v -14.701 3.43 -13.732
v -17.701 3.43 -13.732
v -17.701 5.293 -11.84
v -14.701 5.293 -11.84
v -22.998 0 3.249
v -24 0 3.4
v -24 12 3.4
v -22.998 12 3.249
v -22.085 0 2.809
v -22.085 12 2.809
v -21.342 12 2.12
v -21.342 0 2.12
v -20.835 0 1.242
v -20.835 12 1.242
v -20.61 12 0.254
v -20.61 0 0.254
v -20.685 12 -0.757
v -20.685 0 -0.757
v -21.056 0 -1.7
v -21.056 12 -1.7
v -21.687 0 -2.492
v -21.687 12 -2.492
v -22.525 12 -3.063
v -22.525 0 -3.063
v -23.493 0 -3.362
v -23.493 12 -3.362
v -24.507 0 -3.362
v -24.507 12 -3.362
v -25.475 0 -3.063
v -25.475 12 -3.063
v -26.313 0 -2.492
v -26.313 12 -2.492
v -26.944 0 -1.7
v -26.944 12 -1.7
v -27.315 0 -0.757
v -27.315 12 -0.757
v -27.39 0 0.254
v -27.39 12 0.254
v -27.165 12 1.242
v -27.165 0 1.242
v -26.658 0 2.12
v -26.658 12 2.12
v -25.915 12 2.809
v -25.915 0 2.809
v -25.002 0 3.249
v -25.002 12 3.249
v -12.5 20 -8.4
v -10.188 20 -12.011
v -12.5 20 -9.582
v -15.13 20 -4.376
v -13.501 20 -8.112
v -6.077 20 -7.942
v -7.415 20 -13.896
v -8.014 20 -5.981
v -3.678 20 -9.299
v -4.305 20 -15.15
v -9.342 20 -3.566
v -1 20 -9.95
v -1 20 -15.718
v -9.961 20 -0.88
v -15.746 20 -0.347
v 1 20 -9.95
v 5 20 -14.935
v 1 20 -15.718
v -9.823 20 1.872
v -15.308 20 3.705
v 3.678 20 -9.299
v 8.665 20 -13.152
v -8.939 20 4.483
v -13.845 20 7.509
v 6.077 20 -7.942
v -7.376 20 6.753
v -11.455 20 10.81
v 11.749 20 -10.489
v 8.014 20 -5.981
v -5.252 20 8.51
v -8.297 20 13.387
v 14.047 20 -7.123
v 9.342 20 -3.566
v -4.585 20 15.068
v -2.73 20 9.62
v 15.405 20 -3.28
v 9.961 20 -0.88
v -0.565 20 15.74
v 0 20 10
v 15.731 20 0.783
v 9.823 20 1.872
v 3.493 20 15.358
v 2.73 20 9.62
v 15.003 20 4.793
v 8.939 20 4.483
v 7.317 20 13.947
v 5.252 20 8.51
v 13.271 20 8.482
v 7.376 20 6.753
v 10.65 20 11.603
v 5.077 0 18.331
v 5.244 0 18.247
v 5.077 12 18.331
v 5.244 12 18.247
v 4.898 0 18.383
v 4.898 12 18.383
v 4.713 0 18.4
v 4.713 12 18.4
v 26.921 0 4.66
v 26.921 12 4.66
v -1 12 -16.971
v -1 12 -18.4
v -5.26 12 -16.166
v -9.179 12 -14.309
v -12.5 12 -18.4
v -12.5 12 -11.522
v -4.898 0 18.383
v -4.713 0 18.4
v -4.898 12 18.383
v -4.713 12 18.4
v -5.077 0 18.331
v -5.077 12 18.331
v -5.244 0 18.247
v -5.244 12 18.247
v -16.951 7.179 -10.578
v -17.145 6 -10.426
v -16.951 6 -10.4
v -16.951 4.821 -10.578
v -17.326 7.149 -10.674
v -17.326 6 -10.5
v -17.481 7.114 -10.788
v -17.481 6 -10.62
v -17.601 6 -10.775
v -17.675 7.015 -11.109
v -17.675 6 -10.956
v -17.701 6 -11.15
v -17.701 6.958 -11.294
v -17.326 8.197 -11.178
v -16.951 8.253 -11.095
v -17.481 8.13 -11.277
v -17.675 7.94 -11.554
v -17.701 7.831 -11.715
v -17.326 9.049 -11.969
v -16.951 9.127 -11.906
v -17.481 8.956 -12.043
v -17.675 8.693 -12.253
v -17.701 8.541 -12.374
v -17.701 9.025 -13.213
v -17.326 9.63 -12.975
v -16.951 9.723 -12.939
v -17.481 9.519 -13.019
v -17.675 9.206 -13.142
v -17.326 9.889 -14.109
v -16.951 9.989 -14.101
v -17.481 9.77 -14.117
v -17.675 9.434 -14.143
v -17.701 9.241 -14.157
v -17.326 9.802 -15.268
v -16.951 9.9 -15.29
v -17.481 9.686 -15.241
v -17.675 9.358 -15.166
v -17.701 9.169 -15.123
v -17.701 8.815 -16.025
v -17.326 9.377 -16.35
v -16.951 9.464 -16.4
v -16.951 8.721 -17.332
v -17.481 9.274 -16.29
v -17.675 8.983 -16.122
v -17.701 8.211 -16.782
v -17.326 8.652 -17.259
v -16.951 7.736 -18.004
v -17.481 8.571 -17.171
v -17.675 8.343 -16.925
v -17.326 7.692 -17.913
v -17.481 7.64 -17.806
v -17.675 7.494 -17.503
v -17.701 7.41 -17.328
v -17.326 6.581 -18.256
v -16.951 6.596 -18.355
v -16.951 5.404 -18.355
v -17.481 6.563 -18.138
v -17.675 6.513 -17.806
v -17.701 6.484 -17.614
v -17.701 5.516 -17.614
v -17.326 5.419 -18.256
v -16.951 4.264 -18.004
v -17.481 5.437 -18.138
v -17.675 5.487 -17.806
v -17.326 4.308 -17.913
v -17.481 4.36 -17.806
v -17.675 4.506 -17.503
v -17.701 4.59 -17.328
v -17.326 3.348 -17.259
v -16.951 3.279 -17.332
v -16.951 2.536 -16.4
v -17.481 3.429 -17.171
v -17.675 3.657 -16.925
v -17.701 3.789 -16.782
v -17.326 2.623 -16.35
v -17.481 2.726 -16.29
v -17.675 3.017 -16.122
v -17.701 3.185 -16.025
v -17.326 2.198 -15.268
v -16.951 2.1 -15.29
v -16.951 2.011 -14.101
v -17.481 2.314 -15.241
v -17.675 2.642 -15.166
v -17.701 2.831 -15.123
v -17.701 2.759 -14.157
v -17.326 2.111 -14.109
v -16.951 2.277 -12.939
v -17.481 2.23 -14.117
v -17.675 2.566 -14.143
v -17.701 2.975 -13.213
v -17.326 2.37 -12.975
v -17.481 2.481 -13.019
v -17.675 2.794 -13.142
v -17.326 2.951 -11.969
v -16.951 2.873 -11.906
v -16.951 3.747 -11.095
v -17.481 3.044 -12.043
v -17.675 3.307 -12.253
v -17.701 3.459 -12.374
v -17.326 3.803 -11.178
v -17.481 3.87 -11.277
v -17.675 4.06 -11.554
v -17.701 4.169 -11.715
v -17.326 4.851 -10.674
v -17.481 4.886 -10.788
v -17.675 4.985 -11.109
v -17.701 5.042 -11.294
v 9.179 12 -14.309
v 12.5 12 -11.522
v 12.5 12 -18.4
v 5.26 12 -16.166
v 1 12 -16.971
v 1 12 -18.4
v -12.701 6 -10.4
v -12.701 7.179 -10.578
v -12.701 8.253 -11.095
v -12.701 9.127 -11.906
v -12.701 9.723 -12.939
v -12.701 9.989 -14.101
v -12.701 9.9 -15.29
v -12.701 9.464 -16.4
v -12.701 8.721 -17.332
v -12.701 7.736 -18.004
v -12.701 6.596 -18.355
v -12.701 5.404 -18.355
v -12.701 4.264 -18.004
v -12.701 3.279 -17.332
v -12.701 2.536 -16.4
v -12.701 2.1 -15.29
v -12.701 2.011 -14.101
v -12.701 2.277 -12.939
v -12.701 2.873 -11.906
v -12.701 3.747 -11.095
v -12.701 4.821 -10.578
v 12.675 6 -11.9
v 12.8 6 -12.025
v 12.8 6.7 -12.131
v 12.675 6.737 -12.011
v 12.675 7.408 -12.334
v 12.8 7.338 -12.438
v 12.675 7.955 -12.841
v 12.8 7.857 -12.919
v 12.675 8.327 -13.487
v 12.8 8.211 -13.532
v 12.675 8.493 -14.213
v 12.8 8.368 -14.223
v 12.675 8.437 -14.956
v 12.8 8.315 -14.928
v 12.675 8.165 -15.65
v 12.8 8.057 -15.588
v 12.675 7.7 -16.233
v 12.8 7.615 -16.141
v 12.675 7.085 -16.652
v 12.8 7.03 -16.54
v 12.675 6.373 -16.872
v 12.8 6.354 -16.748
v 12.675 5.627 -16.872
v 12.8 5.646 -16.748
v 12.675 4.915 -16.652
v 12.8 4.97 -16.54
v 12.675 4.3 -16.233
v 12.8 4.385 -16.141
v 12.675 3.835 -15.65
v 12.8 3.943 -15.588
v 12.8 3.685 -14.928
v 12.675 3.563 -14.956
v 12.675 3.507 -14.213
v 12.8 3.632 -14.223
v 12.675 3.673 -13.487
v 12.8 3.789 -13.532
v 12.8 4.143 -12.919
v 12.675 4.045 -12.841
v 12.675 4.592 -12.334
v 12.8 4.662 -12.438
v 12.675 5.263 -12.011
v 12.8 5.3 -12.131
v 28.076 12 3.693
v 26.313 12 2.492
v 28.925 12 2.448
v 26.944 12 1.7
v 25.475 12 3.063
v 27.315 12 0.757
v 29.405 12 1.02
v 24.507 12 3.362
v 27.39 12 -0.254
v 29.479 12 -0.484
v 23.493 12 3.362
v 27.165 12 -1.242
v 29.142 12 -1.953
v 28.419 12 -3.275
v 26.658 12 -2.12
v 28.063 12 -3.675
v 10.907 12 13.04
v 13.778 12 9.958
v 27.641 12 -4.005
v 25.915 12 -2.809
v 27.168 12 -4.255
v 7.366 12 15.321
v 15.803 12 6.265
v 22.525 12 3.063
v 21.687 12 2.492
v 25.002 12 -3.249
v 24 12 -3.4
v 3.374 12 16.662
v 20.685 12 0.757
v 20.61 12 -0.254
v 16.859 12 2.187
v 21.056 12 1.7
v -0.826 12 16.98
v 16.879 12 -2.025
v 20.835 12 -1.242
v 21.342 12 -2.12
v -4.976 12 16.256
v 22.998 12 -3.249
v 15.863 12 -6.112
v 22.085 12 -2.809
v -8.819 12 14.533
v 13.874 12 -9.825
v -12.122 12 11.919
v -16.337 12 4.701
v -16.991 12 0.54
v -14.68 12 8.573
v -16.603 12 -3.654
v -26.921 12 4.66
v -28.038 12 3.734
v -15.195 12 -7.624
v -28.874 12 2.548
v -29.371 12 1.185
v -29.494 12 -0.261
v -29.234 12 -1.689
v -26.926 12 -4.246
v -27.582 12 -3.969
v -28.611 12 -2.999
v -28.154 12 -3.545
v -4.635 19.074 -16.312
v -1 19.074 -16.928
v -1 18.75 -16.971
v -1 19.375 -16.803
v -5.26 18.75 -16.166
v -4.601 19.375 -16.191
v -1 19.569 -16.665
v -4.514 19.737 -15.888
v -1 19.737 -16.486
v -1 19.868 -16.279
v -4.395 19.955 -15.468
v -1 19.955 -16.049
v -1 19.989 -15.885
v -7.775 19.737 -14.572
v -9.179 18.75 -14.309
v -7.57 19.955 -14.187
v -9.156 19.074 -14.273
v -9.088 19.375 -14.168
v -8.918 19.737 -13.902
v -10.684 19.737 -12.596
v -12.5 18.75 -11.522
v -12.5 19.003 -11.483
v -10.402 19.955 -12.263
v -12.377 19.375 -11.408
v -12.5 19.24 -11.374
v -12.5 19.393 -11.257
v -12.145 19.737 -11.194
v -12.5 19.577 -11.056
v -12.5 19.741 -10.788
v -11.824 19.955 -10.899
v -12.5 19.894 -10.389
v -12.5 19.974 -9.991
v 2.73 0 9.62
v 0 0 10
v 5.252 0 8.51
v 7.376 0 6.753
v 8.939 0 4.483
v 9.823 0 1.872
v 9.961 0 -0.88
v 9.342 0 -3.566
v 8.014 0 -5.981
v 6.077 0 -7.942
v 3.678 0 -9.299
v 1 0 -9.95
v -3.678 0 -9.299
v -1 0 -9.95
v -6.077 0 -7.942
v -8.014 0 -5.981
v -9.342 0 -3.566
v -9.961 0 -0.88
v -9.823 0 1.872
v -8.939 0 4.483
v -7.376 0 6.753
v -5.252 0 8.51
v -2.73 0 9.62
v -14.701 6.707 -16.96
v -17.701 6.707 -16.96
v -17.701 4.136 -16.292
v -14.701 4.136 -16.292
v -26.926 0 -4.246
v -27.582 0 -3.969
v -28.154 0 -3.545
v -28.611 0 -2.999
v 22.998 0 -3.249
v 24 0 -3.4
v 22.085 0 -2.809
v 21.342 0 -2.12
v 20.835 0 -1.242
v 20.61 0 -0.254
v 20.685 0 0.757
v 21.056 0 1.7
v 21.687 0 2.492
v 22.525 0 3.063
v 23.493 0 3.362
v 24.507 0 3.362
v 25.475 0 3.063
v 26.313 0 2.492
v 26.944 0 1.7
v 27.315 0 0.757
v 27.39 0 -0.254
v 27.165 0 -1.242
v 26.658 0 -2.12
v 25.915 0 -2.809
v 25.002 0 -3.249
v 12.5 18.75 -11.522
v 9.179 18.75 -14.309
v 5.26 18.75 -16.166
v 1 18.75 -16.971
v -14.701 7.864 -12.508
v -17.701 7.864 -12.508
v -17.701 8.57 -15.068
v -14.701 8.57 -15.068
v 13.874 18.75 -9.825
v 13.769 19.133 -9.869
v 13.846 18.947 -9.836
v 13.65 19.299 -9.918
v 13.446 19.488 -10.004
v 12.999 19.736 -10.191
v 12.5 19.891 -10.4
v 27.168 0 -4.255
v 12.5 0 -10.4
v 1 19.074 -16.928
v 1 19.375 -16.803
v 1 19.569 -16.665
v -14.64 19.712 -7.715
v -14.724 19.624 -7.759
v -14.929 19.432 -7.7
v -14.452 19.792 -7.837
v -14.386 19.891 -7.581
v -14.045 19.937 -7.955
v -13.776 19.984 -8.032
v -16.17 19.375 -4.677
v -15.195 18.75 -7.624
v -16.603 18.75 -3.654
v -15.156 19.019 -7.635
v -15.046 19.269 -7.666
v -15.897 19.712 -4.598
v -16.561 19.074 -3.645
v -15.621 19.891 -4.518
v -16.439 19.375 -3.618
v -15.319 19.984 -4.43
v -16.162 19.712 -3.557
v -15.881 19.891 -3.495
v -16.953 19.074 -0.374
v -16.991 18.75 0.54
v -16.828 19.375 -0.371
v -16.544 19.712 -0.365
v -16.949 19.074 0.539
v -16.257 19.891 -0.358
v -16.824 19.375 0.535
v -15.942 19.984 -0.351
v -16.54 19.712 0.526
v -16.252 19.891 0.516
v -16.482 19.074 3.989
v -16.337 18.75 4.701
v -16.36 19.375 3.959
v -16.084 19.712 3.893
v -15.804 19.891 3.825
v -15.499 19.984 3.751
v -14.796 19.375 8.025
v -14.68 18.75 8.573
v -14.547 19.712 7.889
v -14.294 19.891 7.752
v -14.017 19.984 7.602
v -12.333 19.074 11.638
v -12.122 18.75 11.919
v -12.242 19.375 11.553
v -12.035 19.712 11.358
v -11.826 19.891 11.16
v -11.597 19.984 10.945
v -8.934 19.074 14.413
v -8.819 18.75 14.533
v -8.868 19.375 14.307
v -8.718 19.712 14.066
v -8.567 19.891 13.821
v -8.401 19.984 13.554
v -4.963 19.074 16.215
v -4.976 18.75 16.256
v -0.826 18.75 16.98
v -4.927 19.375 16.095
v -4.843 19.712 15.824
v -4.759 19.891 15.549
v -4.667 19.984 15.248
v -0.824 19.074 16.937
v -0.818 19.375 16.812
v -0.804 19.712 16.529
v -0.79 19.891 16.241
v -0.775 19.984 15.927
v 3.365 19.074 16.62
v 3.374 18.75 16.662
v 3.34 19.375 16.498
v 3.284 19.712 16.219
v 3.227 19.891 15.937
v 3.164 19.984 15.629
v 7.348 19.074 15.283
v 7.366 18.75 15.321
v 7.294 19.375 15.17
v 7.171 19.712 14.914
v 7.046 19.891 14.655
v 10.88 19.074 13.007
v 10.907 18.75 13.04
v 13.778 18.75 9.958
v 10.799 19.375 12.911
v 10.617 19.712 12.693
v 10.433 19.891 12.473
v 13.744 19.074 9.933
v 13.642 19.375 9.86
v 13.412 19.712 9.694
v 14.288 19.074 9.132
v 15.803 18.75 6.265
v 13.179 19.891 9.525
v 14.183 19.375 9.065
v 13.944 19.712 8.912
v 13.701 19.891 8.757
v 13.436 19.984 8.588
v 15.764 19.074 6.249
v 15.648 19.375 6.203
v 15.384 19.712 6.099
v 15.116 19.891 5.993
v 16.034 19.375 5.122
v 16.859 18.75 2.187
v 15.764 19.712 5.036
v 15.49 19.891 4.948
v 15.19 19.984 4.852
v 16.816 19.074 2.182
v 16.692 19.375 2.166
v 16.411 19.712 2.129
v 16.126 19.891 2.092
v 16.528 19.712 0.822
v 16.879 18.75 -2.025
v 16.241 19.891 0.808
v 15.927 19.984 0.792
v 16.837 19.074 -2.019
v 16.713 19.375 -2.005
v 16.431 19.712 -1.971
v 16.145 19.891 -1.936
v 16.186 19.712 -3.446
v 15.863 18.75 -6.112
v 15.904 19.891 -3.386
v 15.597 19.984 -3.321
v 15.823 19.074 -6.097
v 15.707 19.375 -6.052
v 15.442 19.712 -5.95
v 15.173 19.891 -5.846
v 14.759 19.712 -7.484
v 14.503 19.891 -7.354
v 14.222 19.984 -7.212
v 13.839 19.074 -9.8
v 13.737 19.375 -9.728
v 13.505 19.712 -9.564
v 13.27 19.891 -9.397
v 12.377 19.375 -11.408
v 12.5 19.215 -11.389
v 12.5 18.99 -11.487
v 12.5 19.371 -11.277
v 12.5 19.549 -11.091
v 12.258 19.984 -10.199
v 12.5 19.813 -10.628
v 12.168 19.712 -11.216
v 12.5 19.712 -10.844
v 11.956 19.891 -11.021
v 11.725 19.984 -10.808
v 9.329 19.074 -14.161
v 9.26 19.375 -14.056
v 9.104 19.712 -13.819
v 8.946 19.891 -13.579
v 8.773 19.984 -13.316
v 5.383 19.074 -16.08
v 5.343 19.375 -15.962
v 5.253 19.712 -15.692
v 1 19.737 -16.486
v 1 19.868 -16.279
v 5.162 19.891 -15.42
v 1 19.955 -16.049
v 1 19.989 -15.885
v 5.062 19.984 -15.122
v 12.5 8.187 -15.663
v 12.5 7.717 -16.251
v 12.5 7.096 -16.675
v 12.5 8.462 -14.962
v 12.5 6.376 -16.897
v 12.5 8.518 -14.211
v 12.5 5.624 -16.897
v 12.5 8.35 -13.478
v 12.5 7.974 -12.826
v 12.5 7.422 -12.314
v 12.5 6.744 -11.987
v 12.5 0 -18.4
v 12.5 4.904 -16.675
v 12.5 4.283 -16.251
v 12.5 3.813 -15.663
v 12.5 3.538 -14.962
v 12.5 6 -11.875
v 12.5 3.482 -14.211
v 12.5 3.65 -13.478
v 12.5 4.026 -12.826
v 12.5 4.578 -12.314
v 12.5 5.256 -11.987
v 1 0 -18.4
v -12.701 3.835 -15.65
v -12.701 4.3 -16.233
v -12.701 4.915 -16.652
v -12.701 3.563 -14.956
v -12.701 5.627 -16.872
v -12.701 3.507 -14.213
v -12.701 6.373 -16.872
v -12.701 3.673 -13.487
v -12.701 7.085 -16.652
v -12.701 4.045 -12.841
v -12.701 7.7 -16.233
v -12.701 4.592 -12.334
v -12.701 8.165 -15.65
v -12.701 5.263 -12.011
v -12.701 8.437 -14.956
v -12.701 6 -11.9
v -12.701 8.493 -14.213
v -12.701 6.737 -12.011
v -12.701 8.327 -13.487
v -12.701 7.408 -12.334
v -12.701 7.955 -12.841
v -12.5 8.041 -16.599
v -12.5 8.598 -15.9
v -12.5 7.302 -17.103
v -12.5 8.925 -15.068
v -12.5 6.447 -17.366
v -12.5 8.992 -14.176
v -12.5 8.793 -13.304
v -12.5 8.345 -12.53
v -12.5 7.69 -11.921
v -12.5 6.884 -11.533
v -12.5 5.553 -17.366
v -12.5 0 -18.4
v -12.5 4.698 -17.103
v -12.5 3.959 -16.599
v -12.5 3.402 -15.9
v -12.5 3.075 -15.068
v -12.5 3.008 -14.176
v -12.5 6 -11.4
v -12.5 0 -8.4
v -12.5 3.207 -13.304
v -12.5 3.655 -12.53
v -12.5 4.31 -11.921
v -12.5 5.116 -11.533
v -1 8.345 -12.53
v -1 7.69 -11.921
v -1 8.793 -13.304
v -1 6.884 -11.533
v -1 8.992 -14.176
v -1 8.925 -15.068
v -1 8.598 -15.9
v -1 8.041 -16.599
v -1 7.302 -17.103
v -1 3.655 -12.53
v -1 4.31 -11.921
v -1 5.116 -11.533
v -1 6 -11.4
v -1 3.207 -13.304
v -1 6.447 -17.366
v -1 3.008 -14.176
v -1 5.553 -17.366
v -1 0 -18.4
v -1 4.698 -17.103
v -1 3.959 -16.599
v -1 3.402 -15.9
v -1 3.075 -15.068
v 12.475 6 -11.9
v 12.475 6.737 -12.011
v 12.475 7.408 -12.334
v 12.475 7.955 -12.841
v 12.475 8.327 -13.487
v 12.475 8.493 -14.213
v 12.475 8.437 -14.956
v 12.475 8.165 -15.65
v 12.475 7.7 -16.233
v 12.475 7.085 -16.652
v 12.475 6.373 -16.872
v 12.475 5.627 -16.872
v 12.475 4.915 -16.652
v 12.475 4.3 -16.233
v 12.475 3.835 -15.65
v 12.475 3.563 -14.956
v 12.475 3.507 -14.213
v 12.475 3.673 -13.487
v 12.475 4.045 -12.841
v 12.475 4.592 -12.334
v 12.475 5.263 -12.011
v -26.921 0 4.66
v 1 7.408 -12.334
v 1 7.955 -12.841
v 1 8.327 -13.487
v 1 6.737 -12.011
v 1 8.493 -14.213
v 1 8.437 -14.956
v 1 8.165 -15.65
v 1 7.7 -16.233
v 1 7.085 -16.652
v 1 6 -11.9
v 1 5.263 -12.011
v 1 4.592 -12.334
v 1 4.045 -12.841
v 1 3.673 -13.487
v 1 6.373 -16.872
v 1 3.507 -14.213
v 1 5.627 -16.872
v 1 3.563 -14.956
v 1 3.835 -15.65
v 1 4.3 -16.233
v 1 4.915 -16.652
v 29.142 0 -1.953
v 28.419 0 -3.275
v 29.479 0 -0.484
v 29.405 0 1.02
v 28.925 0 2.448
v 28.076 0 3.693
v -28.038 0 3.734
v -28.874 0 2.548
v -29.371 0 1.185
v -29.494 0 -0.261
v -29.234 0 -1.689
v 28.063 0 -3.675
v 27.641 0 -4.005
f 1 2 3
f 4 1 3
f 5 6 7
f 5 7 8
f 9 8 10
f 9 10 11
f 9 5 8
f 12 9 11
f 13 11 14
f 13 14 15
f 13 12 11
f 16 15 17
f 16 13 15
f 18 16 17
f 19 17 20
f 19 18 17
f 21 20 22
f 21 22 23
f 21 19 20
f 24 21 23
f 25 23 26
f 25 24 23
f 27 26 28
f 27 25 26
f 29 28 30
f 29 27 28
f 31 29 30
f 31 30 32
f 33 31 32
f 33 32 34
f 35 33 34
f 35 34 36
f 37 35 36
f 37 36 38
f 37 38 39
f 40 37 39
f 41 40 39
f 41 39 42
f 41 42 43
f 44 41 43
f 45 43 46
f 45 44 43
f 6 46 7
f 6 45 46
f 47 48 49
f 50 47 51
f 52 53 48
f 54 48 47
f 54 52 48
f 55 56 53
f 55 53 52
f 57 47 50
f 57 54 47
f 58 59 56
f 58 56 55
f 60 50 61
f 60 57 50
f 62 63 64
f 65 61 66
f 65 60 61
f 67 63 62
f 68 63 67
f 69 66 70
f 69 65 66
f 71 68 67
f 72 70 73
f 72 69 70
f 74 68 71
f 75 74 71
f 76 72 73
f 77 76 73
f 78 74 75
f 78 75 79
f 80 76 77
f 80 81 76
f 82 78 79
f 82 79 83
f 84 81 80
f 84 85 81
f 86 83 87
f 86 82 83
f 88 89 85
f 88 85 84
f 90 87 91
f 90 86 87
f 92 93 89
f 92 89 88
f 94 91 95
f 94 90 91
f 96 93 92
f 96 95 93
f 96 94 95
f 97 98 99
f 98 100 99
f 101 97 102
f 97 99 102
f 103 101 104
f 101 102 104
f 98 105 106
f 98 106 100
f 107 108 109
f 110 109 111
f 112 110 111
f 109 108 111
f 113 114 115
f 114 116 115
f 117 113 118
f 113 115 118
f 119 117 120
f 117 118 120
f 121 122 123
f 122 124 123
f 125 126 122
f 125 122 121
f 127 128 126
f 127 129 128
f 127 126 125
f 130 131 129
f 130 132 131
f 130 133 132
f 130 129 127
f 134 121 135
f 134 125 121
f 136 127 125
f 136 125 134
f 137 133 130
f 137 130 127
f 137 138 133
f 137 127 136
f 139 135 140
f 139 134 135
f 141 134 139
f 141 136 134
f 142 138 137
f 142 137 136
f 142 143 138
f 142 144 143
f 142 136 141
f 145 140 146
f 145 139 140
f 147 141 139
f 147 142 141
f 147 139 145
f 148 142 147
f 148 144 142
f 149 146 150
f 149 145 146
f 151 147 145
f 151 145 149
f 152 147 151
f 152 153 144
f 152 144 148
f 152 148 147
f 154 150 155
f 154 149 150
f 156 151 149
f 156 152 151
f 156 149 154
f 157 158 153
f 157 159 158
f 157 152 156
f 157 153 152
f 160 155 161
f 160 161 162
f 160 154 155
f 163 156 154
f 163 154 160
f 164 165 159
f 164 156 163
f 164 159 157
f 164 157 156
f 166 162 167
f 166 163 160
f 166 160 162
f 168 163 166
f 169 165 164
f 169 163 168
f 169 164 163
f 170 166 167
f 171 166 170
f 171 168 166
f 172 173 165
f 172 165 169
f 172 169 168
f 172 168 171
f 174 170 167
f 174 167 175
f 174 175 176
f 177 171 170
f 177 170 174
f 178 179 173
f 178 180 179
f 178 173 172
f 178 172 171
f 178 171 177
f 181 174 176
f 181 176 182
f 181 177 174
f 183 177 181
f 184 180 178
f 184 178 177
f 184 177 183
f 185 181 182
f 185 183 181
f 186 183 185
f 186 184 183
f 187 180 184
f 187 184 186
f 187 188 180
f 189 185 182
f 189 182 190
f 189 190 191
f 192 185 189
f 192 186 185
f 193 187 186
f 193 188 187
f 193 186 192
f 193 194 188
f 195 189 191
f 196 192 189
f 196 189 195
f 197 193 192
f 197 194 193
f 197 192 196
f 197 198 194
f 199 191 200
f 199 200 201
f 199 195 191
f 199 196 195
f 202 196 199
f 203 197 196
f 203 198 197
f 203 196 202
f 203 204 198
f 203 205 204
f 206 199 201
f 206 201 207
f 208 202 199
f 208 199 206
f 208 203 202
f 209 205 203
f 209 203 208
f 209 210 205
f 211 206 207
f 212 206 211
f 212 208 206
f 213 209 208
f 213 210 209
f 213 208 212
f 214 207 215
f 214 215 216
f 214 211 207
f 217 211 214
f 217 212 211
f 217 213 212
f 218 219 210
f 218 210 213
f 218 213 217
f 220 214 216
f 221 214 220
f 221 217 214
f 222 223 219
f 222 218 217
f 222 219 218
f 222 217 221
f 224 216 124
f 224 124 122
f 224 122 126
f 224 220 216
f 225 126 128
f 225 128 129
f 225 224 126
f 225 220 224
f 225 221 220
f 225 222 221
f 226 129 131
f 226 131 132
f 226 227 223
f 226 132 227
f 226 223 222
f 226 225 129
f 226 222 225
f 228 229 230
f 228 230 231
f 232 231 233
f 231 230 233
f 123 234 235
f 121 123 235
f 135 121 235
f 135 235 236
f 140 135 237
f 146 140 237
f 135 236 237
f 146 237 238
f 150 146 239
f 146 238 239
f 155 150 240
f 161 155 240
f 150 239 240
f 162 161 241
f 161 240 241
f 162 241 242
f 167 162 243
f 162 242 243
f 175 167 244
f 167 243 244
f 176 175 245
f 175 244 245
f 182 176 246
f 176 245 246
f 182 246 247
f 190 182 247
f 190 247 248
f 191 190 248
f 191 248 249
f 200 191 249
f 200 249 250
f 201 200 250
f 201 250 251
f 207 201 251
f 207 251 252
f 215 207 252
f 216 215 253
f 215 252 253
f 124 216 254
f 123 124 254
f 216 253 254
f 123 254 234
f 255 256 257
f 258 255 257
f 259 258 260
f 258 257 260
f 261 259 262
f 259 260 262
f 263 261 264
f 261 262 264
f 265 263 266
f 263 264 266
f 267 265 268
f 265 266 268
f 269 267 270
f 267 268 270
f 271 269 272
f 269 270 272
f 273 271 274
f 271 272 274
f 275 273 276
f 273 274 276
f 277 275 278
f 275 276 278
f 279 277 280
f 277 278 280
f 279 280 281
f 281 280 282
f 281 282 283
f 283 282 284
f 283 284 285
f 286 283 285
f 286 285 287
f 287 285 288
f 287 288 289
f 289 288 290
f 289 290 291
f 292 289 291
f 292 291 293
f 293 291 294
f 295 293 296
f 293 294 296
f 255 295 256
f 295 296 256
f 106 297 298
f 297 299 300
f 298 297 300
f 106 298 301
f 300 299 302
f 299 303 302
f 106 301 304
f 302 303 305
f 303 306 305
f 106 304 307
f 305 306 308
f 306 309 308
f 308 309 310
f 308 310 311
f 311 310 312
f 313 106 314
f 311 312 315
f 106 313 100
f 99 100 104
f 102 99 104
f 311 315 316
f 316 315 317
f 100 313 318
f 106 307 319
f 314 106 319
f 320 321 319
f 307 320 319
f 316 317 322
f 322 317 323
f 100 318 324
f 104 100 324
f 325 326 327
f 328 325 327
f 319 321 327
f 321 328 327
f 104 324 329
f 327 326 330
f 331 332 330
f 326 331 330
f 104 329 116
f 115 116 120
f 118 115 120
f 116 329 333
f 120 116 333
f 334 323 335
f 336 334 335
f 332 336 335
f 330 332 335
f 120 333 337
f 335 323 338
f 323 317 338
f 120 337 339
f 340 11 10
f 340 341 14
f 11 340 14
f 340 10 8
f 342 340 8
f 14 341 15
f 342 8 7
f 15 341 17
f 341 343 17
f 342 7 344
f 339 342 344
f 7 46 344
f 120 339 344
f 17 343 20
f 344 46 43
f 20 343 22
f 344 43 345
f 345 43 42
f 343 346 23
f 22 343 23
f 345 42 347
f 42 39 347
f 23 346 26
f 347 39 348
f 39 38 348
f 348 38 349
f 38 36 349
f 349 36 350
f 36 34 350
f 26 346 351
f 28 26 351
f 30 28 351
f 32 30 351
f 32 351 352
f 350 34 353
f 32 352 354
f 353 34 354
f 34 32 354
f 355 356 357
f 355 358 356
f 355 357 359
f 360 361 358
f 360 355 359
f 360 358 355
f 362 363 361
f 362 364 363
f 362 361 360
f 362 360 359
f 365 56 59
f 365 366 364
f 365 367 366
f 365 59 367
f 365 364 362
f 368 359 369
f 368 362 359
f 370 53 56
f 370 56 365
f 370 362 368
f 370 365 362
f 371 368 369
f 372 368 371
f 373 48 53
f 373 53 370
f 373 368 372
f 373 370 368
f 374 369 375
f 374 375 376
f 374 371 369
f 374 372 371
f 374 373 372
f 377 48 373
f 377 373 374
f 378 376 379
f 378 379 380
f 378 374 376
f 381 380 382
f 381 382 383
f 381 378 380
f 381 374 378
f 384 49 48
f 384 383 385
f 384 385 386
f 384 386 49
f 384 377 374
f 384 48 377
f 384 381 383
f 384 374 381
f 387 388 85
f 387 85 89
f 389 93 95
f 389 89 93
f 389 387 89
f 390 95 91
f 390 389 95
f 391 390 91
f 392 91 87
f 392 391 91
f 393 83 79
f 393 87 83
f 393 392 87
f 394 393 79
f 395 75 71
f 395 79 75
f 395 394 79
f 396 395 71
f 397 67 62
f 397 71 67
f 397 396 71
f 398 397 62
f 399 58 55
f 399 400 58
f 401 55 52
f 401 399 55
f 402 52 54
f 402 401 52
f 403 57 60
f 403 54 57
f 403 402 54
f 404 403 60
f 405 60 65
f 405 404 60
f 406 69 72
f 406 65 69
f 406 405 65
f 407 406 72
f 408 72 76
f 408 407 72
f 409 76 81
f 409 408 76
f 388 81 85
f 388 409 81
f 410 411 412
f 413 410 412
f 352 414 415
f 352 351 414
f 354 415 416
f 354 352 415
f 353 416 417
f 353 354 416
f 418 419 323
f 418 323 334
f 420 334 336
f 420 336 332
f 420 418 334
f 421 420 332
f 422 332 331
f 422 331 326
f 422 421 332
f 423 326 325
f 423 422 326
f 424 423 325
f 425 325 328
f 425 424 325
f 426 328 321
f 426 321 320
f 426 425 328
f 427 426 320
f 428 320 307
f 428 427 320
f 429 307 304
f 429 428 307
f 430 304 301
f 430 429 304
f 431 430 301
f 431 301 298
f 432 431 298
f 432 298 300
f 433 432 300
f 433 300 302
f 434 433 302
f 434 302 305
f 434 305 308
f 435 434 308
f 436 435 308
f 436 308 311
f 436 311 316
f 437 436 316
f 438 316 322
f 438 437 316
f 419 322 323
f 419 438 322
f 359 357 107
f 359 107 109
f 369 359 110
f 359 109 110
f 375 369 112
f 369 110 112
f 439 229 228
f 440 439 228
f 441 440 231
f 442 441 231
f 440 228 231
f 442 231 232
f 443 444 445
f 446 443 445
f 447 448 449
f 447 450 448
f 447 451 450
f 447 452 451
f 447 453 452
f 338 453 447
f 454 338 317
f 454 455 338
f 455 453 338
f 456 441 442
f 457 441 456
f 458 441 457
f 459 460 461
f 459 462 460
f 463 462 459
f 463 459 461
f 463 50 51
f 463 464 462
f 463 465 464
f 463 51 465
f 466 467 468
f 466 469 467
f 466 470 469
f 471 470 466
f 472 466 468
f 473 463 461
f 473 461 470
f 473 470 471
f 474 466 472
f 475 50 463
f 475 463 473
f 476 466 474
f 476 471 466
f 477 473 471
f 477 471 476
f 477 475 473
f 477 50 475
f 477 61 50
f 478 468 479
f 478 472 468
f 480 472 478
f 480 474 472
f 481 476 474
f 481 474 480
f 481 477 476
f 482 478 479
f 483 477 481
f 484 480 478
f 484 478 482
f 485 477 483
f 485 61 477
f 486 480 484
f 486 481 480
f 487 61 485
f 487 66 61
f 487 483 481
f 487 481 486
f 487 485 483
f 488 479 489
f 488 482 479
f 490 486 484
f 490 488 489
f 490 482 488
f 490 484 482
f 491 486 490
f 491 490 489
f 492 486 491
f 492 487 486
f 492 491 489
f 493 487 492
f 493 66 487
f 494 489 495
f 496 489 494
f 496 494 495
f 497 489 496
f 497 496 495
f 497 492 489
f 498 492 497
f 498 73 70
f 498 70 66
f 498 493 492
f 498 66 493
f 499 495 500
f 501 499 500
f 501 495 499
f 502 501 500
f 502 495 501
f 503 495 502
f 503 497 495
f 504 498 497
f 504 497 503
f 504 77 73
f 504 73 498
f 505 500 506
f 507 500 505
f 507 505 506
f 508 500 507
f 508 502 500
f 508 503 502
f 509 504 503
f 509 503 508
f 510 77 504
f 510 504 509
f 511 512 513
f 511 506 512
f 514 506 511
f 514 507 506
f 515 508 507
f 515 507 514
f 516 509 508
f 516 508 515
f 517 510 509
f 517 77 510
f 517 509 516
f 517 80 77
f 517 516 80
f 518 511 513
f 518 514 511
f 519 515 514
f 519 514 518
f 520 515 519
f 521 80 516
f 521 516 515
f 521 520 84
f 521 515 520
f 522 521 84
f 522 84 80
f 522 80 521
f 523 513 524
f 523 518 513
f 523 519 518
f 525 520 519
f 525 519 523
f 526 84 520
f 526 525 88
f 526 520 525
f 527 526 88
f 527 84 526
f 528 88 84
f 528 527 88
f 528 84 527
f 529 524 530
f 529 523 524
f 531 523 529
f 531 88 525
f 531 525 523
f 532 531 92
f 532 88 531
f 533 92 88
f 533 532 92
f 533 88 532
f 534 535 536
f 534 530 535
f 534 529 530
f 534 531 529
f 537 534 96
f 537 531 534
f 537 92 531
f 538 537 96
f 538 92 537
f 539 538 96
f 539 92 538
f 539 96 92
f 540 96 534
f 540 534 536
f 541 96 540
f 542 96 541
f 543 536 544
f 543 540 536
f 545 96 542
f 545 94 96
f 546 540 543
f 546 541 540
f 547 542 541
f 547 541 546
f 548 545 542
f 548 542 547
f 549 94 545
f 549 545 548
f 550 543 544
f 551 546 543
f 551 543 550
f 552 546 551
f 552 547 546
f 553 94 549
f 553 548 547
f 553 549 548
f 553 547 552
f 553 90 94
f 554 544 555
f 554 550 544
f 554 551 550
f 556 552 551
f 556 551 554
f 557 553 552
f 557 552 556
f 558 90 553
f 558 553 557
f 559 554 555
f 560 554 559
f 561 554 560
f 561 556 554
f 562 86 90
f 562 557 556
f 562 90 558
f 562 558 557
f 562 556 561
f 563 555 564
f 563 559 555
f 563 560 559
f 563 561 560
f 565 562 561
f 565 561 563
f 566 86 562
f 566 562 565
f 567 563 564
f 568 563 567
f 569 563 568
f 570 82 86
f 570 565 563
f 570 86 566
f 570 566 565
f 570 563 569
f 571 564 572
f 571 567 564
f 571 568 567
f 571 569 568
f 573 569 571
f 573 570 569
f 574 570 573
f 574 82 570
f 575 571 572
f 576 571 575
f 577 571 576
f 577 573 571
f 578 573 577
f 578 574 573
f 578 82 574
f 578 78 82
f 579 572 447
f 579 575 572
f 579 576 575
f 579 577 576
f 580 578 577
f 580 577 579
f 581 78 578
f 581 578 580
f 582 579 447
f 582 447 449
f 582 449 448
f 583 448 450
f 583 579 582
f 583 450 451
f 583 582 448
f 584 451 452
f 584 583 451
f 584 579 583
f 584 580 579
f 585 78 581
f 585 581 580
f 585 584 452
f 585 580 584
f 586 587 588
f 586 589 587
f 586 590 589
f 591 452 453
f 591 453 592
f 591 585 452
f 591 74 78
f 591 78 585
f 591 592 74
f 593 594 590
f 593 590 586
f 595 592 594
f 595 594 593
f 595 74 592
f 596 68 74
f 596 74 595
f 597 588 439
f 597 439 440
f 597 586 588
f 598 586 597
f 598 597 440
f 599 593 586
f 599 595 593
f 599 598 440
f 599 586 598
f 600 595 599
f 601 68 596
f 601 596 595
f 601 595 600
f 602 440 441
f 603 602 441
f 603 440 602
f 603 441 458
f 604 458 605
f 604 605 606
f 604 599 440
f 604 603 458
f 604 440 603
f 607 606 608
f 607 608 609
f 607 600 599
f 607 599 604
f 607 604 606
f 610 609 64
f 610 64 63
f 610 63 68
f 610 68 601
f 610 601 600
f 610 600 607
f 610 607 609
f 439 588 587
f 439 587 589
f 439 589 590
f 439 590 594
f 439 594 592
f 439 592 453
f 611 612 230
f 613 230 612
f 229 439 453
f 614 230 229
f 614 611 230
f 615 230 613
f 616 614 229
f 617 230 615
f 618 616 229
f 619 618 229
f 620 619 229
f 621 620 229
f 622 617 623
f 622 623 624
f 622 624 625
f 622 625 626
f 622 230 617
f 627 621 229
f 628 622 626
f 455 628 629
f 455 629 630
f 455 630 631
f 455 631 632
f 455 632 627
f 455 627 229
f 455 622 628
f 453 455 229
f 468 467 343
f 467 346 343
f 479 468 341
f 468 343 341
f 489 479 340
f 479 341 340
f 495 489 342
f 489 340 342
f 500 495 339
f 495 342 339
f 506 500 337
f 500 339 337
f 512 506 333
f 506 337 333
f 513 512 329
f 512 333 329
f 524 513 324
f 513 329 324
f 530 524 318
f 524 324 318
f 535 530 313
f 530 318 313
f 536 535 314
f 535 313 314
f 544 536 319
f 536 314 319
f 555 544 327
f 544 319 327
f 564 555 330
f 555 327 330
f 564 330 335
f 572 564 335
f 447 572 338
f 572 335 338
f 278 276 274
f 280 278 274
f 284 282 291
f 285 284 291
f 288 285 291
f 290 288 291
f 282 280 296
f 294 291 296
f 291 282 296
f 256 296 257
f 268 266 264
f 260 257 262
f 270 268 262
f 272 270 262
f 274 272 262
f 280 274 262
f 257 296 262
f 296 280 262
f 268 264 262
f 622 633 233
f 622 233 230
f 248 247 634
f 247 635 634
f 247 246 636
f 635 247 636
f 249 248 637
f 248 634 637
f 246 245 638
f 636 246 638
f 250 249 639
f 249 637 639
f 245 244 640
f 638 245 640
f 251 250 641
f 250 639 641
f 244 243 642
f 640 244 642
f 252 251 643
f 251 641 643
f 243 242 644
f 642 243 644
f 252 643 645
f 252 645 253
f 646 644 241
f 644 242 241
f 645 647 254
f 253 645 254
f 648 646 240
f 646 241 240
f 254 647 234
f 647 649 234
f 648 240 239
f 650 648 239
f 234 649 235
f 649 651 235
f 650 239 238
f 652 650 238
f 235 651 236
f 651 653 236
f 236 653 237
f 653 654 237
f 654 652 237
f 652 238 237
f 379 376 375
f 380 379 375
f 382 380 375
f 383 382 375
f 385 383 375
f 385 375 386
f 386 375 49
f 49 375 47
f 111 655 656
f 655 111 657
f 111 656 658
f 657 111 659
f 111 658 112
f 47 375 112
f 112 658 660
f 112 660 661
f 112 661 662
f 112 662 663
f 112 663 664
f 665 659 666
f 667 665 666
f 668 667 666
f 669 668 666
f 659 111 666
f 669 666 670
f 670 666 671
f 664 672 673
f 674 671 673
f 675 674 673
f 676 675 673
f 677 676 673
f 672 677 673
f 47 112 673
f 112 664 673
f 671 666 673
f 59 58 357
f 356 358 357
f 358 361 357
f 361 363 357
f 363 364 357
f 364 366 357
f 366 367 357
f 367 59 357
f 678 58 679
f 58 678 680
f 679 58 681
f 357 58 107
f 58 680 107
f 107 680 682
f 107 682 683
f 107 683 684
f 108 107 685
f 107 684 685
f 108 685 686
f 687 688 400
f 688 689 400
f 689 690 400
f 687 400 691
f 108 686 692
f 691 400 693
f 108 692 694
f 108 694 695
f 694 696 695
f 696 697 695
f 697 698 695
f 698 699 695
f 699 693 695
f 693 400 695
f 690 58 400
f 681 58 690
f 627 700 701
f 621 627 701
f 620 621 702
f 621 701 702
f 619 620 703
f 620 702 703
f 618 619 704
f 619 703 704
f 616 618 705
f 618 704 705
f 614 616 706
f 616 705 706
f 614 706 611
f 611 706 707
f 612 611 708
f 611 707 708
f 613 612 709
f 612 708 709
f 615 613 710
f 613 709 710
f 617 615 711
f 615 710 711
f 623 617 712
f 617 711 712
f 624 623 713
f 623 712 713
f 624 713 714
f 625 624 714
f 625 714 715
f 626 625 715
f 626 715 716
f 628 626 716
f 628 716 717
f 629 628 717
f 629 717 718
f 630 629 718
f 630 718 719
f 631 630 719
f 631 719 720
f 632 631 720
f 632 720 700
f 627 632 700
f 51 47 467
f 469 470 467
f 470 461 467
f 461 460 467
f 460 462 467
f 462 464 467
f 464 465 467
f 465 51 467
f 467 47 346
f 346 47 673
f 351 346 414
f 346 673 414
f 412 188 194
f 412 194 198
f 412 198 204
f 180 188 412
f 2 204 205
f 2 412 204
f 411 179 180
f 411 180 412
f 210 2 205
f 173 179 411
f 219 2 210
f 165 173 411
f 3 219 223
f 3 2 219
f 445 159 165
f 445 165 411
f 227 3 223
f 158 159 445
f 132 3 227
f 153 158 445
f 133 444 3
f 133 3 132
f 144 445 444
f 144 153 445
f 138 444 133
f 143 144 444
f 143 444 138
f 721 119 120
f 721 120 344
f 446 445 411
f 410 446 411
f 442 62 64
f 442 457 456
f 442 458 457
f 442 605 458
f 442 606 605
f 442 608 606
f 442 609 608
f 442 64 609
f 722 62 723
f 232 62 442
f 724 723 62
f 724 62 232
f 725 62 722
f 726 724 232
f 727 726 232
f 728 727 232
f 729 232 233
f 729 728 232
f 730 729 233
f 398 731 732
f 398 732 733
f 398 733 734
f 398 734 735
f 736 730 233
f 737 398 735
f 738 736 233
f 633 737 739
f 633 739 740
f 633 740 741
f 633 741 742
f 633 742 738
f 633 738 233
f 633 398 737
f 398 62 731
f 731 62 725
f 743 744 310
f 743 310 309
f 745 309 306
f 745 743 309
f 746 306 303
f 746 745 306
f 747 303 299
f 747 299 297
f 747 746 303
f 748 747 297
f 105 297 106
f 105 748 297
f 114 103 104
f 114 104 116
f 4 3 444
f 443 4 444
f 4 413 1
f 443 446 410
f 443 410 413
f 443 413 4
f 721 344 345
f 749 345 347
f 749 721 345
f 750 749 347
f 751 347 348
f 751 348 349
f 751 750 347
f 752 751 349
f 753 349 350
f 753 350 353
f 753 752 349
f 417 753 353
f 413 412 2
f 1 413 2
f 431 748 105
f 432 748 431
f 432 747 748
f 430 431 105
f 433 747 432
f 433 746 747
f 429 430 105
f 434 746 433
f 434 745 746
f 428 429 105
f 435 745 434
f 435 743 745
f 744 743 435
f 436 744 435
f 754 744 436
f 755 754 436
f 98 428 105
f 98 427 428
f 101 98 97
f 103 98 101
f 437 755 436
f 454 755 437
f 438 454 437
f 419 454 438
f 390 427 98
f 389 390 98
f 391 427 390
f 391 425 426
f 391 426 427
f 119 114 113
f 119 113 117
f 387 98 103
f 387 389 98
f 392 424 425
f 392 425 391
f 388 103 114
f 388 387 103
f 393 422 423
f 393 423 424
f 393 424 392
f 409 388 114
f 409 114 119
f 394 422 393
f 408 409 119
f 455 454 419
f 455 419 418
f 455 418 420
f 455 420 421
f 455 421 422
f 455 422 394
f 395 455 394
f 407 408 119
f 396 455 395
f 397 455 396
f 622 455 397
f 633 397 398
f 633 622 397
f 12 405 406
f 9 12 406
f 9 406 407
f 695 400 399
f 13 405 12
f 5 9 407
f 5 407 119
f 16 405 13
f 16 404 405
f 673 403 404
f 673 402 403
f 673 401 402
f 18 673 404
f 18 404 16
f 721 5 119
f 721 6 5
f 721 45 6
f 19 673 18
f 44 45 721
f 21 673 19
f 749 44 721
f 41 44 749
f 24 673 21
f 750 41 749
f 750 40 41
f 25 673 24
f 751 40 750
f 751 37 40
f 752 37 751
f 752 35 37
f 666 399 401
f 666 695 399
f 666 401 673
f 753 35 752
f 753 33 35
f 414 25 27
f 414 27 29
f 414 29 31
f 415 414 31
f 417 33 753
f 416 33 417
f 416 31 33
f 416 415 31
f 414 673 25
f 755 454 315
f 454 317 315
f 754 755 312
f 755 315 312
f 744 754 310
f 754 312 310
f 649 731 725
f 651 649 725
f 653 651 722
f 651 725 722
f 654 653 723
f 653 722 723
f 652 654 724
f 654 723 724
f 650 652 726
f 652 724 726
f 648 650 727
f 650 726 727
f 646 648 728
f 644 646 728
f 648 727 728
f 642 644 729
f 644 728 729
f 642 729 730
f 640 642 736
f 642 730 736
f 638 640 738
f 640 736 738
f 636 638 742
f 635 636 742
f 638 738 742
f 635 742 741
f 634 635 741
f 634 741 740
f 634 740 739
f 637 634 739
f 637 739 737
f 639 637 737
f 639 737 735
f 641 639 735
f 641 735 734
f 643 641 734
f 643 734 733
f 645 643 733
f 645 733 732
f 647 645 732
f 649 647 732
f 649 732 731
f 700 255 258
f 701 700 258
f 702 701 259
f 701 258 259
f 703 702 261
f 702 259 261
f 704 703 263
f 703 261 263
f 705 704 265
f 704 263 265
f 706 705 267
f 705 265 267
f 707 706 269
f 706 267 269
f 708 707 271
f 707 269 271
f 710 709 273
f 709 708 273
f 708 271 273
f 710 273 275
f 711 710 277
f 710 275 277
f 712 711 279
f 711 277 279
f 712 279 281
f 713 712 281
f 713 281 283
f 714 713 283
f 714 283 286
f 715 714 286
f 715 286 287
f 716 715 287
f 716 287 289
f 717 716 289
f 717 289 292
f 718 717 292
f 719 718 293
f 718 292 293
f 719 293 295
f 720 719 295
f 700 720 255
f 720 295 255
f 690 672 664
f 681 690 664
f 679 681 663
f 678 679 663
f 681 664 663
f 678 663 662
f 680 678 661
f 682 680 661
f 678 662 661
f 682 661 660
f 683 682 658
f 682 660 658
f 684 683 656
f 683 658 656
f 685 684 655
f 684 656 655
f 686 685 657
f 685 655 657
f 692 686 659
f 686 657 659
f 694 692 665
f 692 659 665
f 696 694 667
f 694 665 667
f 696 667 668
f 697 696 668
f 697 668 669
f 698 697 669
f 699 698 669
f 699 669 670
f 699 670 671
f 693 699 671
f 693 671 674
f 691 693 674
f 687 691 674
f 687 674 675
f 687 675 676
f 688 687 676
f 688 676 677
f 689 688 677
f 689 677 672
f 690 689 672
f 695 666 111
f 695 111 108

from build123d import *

# Parameters (mm, degrees)
SKETCH1_R                   = 3.4
BOSS_EXTRUDE1_DEPTH         = 12
SKETCH3_R                   = 17
BOSS_EXTRUDE2_DEPTH         = 8
FILLET1_R                   = 1.25
CUT_EXTRUDE1_DEPTH          = 37.78056552
CUT_EXTRUDE1_DEPTH_BACK     = 37.78056552
CUT_EXTRUDE2_DEPTH          = 41.109973918
CUT_EXTRUDE2_DEPTH_BACK     = 41.109973918
SKETCH4_R                   = 10
CUT_EXTRUDE3_DEPTH          = 41.109973918
CUT_EXTRUDE3_DEPTH_BACK     = 41.109973918
SKETCH5_W                   = 2
SKETCH5_H                   = 20
SKETCH7_R                   = 3
CUT_EXTRUDE4_DEPTH          = 12.5
FILLET2_R                   = 3
FILLET3_R                   = 1
M5_TAPPED_HOLE2_D           = 4.2
M5_TAPPED_HOLE2_CSINK_D     = 5.05
M5_TAPPED_HOLE2_CSINK_ANGLE = 90
BOSS_EXTRUDE4_DEPTH         = 0.001
BOSS_EXTRUDE4_DEPTH_BACK    = 25.5
SKETCH26_R                  = 2.5
SKETCH28_R                  = 4
BOSS_EXTRUDE5_DEPTH         = 5
CHAMFER1_SIZE               = 0.125
CUT_EXTRUDE5_DEPTH          = 3
FILLET4_R                   = 0.75


with BuildPart() as part:
    # Sketch1 → Boss-Extrude1 (new body)
    with BuildSketch(Plane(origin=(0, 0, 0), x_dir=(1, 0, 0), z_dir=(0, 1, 0))):
        with BuildLine():
            Line((5, -18.4), (-5, -18.4))
            Line((-5, -18.4), (-26.920975839, -4.66024679))
            ThreePointArc((-26.920975839, -4.66024679), (-29.473599119, -0.538249647), (-27.772784233, 4.002011885))
            Line((-27.772784233, 4.002011885), (-12.5, 18.4))
            Line((-12.5, 18.4), (12.5, 18.4))
            Line((12.5, 18.4), (27.772784233, 4.002011885))
            ThreePointArc((27.772784233, 4.002011885), (29.473599119, -0.538249647), (26.920975839, -4.66024679))
            Line((26.920975839, -4.66024679), (5, -18.4))
        make_face()
        with Locations(Location((-24, 0, 0), (0, 0, 270))):
            Circle(SKETCH1_R, mode=Mode.SUBTRACT)
        with Locations(Location((24, 0, 0), (0, 0, 90))):
            Circle(SKETCH1_R, mode=Mode.SUBTRACT)
    extrude(amount=BOSS_EXTRUDE1_DEPTH)

    # Sketch3 → Boss-Extrude2 (add)
    with BuildSketch(Plane(origin=(0, 12, 0), x_dir=(1, 0, 0), z_dir=(0, 1, 0))):
        with Locations(Location((0, 0, 0), (0, 0, 270))):
            Circle(SKETCH3_R)
    extrude(amount=BOSS_EXTRUDE2_DEPTH)

    # Fillet1
    fillet1_edges = [part.edges().sort_by_distance(p)[0] for p in [
        (0, 20, -17),
    ]]
    fillet(fillet1_edges, radius=FILLET1_R)

    # Sketch2 → Cut-Extrude1 (cut, two sides: drawn at the far end of the back side and taken through both)
    with BuildSketch(Plane(origin=(0, 12, 0), x_dir=(1, 0, 0), z_dir=(0, 1, 0)).offset(-CUT_EXTRUDE1_DEPTH_BACK)):
        Polygon((12.5, 18.4), (12.5, 10.4), (27.772784233, 4.002011885), align=None)
        Polygon((-12.5, 18.4), (-12.5, 8.399645995), (-27.772784233, 4.002011885), align=None)
    extrude(amount=CUT_EXTRUDE1_DEPTH + CUT_EXTRUDE1_DEPTH_BACK, mode=Mode.SUBTRACT)

    # Sketch4 → Cut-Extrude2 (cut, two sides: drawn at the far end of the back side and taken through both)
    with BuildSketch(Plane(origin=(0, 20, 0), x_dir=(1, 0, 0), z_dir=(0, 1, 0)).offset(-CUT_EXTRUDE2_DEPTH_BACK)):
        with Locations(Location((0, 0, 0), (0, 0, 270))):
            Circle(SKETCH4_R)
    extrude(amount=CUT_EXTRUDE2_DEPTH + CUT_EXTRUDE2_DEPTH_BACK, mode=Mode.SUBTRACT)

    # Sketch5 → Cut-Extrude3 (cut, two sides: drawn at the far end of the back side and taken through both)
    with BuildSketch(Plane(origin=(0, 20, 0), x_dir=(1, 0, 0), z_dir=(0, 1, 0)).offset(-CUT_EXTRUDE3_DEPTH_BACK)):
        with Locations((0, 10)):
            Rectangle(SKETCH5_W, SKETCH5_H)
    extrude(amount=CUT_EXTRUDE3_DEPTH + CUT_EXTRUDE3_DEPTH_BACK, mode=Mode.SUBTRACT)

    # Sketch7 → Cut-Extrude4 (cut)
    with BuildSketch(Plane.ZY.offset(12.5)):
        with Locations((-14.4, 6)):
            Circle(SKETCH7_R)
    extrude(amount=-CUT_EXTRUDE4_DEPTH, mode=Mode.SUBTRACT)

    # Fillet2
    fillet2_edges = [part.edges().sort_by_distance(p)[0] for p in [
        (27.772784233, 6, -4.002011885),
        (-27.772784233, 6, -4.002011885),
    ]]
    fillet(fillet2_edges, radius=FILLET2_R)

    # Fillet3
    fillet3_edges = [part.edges().sort_by_distance(p)[0] for p in [
        (5, 6, 18.4),
        (-5, 6, 18.4),
    ]]
    fillet(fillet3_edges, radius=FILLET3_R)

    # M5 Tapped Hole2 (through all)
    with Locations(Plane(origin=(12.5, 0, 0), x_dir=(0, 0, -1), z_dir=(1, 0, 0))):
        with Locations((14.4, 6)):
            CounterSinkHole(M5_TAPPED_HOLE2_D / 2, M5_TAPPED_HOLE2_CSINK_D / 2, counter_sink_angle=M5_TAPPED_HOLE2_CSINK_ANGLE)



with BuildPart() as body_2:
    # Sketch26 → Boss-Extrude4 (new, two sides: drawn at the far end of the back side and taken through both)
    with BuildSketch(Plane.ZY.offset(12.7).offset(-BOSS_EXTRUDE4_DEPTH_BACK)):
        with Locations((-14.4, 6)):
            Circle(SKETCH26_R)
    extrude(amount=BOSS_EXTRUDE4_DEPTH + BOSS_EXTRUDE4_DEPTH_BACK)


with BuildPart() as part_1:
    add(part.part)

    add(body_2.part)  # Boss-Extrude5 merges body 2
    # Sketch28 → Boss-Extrude5 (add)
    with BuildSketch(Plane.ZY.offset(12.701)):
        with Locations((-14.4, 6)):
            Circle(SKETCH28_R)
    extrude(amount=BOSS_EXTRUDE5_DEPTH)

    # Chamfer1
    chamfer1_edges = [part_1.edges().sort_by_distance(p)[0] for p in [
        (12.8, 6, -16.9),
    ]]
    chamfer(chamfer1_edges, length=CHAMFER1_SIZE)

    # Sketch29 → Cut-Extrude5 (cut)
    with BuildSketch(Plane.ZY.offset(17.701)):
        Polygon((-15.067828808, 8.570474279), (-16.960010429, 6.706880427), (-16.292181621, 4.136406148), (-13.732171192, 3.429525721), (-11.839989571, 5.293119573), (-12.507818379, 7.863593852), align=None)
    extrude(amount=-CUT_EXTRUDE5_DEPTH, mode=Mode.SUBTRACT)

    # Fillet4
    fillet4_edges = [part_1.edges().sort_by_distance(p)[0] for p in [
        (-17.701, 6, -18.4),
    ]]
    fillet(fillet4_edges, radius=FILLET4_R)


solid = part_1.part
